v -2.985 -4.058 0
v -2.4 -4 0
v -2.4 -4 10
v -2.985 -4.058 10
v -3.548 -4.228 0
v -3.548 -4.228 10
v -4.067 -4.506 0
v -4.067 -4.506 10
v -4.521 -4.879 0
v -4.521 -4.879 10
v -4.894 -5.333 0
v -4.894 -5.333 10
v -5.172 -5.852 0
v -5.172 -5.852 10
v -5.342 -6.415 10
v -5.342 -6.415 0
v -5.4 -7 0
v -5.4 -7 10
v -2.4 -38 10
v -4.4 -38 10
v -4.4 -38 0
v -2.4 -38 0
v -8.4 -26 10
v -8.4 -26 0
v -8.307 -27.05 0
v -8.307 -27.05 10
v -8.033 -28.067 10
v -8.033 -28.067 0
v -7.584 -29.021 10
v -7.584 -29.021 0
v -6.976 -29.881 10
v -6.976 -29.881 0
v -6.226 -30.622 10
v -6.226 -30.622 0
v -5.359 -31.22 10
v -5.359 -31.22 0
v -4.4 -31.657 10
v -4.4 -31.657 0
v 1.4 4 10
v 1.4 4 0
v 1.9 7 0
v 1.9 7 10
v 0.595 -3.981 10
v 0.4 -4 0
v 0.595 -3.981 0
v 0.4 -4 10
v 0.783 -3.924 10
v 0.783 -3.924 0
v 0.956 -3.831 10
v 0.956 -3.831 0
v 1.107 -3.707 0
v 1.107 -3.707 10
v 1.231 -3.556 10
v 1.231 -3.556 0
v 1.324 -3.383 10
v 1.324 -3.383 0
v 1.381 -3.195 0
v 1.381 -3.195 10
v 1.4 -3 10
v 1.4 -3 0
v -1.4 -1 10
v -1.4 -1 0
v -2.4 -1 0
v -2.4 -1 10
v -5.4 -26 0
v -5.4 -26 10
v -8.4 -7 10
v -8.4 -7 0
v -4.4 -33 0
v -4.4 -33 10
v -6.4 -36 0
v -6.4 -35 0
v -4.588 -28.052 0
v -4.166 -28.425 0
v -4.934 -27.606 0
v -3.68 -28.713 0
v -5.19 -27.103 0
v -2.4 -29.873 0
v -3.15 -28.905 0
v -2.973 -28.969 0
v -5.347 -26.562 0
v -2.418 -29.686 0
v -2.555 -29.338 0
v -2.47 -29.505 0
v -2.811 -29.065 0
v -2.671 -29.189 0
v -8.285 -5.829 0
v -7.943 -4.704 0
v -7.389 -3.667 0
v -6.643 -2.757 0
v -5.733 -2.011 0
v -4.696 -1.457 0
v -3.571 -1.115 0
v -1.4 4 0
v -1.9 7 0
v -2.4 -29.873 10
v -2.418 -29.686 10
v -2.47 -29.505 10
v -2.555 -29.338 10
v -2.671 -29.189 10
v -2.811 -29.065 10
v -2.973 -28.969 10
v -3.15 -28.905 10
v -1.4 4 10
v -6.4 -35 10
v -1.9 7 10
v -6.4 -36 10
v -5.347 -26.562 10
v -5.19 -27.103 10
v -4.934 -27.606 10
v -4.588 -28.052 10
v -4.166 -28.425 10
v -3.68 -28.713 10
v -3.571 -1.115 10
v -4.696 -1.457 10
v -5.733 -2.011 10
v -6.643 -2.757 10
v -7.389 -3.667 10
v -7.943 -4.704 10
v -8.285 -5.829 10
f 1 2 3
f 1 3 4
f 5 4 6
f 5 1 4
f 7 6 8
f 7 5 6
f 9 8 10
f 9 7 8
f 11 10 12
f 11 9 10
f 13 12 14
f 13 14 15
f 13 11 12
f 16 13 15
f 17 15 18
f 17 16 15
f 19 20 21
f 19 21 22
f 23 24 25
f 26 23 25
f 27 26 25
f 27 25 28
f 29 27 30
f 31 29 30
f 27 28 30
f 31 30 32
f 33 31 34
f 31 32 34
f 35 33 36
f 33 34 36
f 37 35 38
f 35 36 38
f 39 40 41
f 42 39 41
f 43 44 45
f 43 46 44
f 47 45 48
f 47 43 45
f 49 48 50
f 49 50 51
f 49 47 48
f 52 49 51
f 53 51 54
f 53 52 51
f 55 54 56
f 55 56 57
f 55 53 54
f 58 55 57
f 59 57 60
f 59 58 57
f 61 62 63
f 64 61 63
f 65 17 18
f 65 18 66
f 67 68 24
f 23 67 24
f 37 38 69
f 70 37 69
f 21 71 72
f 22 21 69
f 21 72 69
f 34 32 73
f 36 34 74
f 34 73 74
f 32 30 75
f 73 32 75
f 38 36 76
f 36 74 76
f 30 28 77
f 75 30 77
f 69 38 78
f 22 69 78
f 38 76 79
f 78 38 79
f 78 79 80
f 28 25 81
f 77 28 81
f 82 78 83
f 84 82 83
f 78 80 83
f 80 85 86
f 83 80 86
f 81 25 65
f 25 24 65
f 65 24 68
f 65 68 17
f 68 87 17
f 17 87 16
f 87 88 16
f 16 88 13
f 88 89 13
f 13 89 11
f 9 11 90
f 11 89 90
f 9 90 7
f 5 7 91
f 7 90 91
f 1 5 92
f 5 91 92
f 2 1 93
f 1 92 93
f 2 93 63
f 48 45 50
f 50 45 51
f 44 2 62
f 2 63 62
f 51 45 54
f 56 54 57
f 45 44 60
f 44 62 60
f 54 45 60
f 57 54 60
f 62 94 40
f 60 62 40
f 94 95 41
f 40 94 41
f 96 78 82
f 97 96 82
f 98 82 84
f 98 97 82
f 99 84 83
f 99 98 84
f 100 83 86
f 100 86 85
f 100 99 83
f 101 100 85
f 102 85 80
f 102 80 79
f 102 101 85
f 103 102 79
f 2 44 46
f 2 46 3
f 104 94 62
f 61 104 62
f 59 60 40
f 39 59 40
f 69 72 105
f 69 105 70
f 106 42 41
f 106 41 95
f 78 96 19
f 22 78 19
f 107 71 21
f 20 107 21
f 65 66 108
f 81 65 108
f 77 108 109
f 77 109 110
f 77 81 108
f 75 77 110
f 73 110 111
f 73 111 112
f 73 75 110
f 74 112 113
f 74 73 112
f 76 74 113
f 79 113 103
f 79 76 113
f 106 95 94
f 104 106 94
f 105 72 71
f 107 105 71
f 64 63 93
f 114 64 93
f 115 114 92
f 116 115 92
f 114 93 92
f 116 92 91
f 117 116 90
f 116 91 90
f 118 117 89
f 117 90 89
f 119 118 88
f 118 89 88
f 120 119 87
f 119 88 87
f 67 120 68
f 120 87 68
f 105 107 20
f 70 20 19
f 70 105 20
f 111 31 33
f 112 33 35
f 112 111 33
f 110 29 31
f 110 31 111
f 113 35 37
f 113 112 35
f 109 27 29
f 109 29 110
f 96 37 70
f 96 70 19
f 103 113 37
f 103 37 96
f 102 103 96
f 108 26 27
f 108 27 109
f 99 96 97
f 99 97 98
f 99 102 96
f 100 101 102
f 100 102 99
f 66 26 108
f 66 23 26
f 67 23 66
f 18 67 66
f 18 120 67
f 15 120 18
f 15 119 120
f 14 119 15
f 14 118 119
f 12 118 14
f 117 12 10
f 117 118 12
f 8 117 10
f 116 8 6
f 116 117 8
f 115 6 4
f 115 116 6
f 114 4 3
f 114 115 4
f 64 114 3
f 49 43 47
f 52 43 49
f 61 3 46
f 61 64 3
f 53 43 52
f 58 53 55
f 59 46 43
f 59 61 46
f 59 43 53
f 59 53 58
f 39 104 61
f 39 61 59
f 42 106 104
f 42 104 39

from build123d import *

# Parameters (mm, degrees)
PAD_DEPTH = 10
FILLET_R  = 1


with BuildPart() as part:
    # Sketch → Pad (new body)
    with BuildSketch(Plane.XY):
        with BuildLine():
            Line((-1.4, 4), (-1.4, -1))
            Line((-1.4, -1), (-2.4, -1))
            ThreePointArc((-2.4, -1), (-6.642641, -2.757359), (-8.4, -7))
            Line((-8.4, -7), (-8.4, -26))
            ThreePointArc((-8.4, -26), (-7.298979, -29.464102), (-4.4, -31.656854))
            Line((-4.4, -31.656854), (-4.4, -33))
            Line((-6.4, -35), (-4.4, -33))
            Line((-6.4, -35), (-6.4, -36))
            Line((-6.4, -36), (-4.4, -38))
            Line((-4.4, -38), (-2.4, -38))
            Line((-2.4, -29), (-2.4, -38))
            ThreePointArc((-5.4, -26), (-4.52132, -28.12132), (-2.4, -29))
            Line((-5.4, -7), (-5.4, -26))
            ThreePointArc((-2.4, -4), (-4.52132, -4.87868), (-5.4, -7))
            Line((1.4, -4), (-2.4, -4))
            Line((1.4, -4), (1.4, 4))
            Line((1.4, 4), (1.9, 7))
            Line((1.9, 7), (-1.9, 7))
            Line((-1.9, 7), (-1.4, 4))
        make_face()
    extrude(amount=PAD_DEPTH)

    # Fillet
    fillet_edges = [part.edges().sort_by_distance(p)[0] for p in [
        (1.4, -4, 5),
        (-2.4, -29, 5),
    ]]
    fillet(fillet_edges, radius=FILLET_R)


solid = part.part
